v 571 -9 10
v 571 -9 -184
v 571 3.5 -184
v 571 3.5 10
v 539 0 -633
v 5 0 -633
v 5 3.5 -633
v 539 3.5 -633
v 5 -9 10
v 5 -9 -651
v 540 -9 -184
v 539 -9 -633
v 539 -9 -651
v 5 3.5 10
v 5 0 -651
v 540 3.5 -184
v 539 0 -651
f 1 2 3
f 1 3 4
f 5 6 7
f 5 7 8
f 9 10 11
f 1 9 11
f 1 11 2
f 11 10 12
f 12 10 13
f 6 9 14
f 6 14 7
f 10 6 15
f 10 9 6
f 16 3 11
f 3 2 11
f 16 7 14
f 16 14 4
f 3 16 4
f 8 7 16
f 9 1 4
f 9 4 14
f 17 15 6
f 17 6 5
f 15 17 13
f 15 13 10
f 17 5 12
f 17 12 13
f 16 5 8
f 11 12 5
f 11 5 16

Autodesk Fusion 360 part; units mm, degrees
sketch "Sketch1" plane through (0, 0, 0) normal (0, 1, 0) x (1, 0, 0)
  line L0 (5, 0) -> (5, 633)
  line L1 (571, 0) -> (571, 184)
  line L2 (539, 633) -> (539, 200)
  line L3 (571, 184) -> (540, 184)
  line L4 (539, 200) -> (539, 184)
  line L5 (539, 184) -> (540, 184)
  line L6 (5, 633) -> (5, 651)
  line L7 (539, 633) -> (539, 651)
  line L8 (539, 651) -> (5, 651)
  line L9 (5, 651) -> (5, 623)
  line L10 (539, 651) -> (539, 623)
  line L11 (5, 0) -> (5, -10)
  line L12 (571, 0) -> (571, -10)
  line L13 (571, -10) -> (5, -10)
  line L14 (5, 633) -> (539, 633)
  dimension "d1" = 633
  dimension "d3" = 184
  dimension "d4" = 534
  dimension "d5" = 433
  dimension "d6" = 31
  dimension "d7" = 16
  dimension "d8" = 18
  dimension "d9" = 18
  dimension "d10" = 28
  dimension "d11" = 28
  dimension "d12" = 10
  dimension "d13" = 10
  dimension "d14" = 566
sketch "Sketch2" plane through (0, 0, 0) normal (0, 1, 0) x (1, 0, 0)
  line L0 (539, 633) -> (539, 200)
  line L1 (5, 633) -> (539, 633)
  line L2 (539, 633) -> (540, 184)
  line L3 (571, 184) -> (540, 184)
  line L4 (540, 184) -> (571, 184)
  line L5 (571, 184) -> (571, -10)
  line L6 (571, -10) -> (5, -10)
  line L7 (5, -10) -> (5, 633)
  point P0 (5, 633)
  point P1 (539, 633)
  point P2 (540, 184)
  point P3 (571, 184)
  point P4 (571, -10)
  point P5 (5, -10)
extrude "Extrude1" add sketch "Sketch1" sketch "Sketch2" against normal blind 9 contours L6 L7 L8 L9 L10 L14 of sketch 2
extrude "Extrude2" add sketch "Sketch2" along normal blind 3.5
